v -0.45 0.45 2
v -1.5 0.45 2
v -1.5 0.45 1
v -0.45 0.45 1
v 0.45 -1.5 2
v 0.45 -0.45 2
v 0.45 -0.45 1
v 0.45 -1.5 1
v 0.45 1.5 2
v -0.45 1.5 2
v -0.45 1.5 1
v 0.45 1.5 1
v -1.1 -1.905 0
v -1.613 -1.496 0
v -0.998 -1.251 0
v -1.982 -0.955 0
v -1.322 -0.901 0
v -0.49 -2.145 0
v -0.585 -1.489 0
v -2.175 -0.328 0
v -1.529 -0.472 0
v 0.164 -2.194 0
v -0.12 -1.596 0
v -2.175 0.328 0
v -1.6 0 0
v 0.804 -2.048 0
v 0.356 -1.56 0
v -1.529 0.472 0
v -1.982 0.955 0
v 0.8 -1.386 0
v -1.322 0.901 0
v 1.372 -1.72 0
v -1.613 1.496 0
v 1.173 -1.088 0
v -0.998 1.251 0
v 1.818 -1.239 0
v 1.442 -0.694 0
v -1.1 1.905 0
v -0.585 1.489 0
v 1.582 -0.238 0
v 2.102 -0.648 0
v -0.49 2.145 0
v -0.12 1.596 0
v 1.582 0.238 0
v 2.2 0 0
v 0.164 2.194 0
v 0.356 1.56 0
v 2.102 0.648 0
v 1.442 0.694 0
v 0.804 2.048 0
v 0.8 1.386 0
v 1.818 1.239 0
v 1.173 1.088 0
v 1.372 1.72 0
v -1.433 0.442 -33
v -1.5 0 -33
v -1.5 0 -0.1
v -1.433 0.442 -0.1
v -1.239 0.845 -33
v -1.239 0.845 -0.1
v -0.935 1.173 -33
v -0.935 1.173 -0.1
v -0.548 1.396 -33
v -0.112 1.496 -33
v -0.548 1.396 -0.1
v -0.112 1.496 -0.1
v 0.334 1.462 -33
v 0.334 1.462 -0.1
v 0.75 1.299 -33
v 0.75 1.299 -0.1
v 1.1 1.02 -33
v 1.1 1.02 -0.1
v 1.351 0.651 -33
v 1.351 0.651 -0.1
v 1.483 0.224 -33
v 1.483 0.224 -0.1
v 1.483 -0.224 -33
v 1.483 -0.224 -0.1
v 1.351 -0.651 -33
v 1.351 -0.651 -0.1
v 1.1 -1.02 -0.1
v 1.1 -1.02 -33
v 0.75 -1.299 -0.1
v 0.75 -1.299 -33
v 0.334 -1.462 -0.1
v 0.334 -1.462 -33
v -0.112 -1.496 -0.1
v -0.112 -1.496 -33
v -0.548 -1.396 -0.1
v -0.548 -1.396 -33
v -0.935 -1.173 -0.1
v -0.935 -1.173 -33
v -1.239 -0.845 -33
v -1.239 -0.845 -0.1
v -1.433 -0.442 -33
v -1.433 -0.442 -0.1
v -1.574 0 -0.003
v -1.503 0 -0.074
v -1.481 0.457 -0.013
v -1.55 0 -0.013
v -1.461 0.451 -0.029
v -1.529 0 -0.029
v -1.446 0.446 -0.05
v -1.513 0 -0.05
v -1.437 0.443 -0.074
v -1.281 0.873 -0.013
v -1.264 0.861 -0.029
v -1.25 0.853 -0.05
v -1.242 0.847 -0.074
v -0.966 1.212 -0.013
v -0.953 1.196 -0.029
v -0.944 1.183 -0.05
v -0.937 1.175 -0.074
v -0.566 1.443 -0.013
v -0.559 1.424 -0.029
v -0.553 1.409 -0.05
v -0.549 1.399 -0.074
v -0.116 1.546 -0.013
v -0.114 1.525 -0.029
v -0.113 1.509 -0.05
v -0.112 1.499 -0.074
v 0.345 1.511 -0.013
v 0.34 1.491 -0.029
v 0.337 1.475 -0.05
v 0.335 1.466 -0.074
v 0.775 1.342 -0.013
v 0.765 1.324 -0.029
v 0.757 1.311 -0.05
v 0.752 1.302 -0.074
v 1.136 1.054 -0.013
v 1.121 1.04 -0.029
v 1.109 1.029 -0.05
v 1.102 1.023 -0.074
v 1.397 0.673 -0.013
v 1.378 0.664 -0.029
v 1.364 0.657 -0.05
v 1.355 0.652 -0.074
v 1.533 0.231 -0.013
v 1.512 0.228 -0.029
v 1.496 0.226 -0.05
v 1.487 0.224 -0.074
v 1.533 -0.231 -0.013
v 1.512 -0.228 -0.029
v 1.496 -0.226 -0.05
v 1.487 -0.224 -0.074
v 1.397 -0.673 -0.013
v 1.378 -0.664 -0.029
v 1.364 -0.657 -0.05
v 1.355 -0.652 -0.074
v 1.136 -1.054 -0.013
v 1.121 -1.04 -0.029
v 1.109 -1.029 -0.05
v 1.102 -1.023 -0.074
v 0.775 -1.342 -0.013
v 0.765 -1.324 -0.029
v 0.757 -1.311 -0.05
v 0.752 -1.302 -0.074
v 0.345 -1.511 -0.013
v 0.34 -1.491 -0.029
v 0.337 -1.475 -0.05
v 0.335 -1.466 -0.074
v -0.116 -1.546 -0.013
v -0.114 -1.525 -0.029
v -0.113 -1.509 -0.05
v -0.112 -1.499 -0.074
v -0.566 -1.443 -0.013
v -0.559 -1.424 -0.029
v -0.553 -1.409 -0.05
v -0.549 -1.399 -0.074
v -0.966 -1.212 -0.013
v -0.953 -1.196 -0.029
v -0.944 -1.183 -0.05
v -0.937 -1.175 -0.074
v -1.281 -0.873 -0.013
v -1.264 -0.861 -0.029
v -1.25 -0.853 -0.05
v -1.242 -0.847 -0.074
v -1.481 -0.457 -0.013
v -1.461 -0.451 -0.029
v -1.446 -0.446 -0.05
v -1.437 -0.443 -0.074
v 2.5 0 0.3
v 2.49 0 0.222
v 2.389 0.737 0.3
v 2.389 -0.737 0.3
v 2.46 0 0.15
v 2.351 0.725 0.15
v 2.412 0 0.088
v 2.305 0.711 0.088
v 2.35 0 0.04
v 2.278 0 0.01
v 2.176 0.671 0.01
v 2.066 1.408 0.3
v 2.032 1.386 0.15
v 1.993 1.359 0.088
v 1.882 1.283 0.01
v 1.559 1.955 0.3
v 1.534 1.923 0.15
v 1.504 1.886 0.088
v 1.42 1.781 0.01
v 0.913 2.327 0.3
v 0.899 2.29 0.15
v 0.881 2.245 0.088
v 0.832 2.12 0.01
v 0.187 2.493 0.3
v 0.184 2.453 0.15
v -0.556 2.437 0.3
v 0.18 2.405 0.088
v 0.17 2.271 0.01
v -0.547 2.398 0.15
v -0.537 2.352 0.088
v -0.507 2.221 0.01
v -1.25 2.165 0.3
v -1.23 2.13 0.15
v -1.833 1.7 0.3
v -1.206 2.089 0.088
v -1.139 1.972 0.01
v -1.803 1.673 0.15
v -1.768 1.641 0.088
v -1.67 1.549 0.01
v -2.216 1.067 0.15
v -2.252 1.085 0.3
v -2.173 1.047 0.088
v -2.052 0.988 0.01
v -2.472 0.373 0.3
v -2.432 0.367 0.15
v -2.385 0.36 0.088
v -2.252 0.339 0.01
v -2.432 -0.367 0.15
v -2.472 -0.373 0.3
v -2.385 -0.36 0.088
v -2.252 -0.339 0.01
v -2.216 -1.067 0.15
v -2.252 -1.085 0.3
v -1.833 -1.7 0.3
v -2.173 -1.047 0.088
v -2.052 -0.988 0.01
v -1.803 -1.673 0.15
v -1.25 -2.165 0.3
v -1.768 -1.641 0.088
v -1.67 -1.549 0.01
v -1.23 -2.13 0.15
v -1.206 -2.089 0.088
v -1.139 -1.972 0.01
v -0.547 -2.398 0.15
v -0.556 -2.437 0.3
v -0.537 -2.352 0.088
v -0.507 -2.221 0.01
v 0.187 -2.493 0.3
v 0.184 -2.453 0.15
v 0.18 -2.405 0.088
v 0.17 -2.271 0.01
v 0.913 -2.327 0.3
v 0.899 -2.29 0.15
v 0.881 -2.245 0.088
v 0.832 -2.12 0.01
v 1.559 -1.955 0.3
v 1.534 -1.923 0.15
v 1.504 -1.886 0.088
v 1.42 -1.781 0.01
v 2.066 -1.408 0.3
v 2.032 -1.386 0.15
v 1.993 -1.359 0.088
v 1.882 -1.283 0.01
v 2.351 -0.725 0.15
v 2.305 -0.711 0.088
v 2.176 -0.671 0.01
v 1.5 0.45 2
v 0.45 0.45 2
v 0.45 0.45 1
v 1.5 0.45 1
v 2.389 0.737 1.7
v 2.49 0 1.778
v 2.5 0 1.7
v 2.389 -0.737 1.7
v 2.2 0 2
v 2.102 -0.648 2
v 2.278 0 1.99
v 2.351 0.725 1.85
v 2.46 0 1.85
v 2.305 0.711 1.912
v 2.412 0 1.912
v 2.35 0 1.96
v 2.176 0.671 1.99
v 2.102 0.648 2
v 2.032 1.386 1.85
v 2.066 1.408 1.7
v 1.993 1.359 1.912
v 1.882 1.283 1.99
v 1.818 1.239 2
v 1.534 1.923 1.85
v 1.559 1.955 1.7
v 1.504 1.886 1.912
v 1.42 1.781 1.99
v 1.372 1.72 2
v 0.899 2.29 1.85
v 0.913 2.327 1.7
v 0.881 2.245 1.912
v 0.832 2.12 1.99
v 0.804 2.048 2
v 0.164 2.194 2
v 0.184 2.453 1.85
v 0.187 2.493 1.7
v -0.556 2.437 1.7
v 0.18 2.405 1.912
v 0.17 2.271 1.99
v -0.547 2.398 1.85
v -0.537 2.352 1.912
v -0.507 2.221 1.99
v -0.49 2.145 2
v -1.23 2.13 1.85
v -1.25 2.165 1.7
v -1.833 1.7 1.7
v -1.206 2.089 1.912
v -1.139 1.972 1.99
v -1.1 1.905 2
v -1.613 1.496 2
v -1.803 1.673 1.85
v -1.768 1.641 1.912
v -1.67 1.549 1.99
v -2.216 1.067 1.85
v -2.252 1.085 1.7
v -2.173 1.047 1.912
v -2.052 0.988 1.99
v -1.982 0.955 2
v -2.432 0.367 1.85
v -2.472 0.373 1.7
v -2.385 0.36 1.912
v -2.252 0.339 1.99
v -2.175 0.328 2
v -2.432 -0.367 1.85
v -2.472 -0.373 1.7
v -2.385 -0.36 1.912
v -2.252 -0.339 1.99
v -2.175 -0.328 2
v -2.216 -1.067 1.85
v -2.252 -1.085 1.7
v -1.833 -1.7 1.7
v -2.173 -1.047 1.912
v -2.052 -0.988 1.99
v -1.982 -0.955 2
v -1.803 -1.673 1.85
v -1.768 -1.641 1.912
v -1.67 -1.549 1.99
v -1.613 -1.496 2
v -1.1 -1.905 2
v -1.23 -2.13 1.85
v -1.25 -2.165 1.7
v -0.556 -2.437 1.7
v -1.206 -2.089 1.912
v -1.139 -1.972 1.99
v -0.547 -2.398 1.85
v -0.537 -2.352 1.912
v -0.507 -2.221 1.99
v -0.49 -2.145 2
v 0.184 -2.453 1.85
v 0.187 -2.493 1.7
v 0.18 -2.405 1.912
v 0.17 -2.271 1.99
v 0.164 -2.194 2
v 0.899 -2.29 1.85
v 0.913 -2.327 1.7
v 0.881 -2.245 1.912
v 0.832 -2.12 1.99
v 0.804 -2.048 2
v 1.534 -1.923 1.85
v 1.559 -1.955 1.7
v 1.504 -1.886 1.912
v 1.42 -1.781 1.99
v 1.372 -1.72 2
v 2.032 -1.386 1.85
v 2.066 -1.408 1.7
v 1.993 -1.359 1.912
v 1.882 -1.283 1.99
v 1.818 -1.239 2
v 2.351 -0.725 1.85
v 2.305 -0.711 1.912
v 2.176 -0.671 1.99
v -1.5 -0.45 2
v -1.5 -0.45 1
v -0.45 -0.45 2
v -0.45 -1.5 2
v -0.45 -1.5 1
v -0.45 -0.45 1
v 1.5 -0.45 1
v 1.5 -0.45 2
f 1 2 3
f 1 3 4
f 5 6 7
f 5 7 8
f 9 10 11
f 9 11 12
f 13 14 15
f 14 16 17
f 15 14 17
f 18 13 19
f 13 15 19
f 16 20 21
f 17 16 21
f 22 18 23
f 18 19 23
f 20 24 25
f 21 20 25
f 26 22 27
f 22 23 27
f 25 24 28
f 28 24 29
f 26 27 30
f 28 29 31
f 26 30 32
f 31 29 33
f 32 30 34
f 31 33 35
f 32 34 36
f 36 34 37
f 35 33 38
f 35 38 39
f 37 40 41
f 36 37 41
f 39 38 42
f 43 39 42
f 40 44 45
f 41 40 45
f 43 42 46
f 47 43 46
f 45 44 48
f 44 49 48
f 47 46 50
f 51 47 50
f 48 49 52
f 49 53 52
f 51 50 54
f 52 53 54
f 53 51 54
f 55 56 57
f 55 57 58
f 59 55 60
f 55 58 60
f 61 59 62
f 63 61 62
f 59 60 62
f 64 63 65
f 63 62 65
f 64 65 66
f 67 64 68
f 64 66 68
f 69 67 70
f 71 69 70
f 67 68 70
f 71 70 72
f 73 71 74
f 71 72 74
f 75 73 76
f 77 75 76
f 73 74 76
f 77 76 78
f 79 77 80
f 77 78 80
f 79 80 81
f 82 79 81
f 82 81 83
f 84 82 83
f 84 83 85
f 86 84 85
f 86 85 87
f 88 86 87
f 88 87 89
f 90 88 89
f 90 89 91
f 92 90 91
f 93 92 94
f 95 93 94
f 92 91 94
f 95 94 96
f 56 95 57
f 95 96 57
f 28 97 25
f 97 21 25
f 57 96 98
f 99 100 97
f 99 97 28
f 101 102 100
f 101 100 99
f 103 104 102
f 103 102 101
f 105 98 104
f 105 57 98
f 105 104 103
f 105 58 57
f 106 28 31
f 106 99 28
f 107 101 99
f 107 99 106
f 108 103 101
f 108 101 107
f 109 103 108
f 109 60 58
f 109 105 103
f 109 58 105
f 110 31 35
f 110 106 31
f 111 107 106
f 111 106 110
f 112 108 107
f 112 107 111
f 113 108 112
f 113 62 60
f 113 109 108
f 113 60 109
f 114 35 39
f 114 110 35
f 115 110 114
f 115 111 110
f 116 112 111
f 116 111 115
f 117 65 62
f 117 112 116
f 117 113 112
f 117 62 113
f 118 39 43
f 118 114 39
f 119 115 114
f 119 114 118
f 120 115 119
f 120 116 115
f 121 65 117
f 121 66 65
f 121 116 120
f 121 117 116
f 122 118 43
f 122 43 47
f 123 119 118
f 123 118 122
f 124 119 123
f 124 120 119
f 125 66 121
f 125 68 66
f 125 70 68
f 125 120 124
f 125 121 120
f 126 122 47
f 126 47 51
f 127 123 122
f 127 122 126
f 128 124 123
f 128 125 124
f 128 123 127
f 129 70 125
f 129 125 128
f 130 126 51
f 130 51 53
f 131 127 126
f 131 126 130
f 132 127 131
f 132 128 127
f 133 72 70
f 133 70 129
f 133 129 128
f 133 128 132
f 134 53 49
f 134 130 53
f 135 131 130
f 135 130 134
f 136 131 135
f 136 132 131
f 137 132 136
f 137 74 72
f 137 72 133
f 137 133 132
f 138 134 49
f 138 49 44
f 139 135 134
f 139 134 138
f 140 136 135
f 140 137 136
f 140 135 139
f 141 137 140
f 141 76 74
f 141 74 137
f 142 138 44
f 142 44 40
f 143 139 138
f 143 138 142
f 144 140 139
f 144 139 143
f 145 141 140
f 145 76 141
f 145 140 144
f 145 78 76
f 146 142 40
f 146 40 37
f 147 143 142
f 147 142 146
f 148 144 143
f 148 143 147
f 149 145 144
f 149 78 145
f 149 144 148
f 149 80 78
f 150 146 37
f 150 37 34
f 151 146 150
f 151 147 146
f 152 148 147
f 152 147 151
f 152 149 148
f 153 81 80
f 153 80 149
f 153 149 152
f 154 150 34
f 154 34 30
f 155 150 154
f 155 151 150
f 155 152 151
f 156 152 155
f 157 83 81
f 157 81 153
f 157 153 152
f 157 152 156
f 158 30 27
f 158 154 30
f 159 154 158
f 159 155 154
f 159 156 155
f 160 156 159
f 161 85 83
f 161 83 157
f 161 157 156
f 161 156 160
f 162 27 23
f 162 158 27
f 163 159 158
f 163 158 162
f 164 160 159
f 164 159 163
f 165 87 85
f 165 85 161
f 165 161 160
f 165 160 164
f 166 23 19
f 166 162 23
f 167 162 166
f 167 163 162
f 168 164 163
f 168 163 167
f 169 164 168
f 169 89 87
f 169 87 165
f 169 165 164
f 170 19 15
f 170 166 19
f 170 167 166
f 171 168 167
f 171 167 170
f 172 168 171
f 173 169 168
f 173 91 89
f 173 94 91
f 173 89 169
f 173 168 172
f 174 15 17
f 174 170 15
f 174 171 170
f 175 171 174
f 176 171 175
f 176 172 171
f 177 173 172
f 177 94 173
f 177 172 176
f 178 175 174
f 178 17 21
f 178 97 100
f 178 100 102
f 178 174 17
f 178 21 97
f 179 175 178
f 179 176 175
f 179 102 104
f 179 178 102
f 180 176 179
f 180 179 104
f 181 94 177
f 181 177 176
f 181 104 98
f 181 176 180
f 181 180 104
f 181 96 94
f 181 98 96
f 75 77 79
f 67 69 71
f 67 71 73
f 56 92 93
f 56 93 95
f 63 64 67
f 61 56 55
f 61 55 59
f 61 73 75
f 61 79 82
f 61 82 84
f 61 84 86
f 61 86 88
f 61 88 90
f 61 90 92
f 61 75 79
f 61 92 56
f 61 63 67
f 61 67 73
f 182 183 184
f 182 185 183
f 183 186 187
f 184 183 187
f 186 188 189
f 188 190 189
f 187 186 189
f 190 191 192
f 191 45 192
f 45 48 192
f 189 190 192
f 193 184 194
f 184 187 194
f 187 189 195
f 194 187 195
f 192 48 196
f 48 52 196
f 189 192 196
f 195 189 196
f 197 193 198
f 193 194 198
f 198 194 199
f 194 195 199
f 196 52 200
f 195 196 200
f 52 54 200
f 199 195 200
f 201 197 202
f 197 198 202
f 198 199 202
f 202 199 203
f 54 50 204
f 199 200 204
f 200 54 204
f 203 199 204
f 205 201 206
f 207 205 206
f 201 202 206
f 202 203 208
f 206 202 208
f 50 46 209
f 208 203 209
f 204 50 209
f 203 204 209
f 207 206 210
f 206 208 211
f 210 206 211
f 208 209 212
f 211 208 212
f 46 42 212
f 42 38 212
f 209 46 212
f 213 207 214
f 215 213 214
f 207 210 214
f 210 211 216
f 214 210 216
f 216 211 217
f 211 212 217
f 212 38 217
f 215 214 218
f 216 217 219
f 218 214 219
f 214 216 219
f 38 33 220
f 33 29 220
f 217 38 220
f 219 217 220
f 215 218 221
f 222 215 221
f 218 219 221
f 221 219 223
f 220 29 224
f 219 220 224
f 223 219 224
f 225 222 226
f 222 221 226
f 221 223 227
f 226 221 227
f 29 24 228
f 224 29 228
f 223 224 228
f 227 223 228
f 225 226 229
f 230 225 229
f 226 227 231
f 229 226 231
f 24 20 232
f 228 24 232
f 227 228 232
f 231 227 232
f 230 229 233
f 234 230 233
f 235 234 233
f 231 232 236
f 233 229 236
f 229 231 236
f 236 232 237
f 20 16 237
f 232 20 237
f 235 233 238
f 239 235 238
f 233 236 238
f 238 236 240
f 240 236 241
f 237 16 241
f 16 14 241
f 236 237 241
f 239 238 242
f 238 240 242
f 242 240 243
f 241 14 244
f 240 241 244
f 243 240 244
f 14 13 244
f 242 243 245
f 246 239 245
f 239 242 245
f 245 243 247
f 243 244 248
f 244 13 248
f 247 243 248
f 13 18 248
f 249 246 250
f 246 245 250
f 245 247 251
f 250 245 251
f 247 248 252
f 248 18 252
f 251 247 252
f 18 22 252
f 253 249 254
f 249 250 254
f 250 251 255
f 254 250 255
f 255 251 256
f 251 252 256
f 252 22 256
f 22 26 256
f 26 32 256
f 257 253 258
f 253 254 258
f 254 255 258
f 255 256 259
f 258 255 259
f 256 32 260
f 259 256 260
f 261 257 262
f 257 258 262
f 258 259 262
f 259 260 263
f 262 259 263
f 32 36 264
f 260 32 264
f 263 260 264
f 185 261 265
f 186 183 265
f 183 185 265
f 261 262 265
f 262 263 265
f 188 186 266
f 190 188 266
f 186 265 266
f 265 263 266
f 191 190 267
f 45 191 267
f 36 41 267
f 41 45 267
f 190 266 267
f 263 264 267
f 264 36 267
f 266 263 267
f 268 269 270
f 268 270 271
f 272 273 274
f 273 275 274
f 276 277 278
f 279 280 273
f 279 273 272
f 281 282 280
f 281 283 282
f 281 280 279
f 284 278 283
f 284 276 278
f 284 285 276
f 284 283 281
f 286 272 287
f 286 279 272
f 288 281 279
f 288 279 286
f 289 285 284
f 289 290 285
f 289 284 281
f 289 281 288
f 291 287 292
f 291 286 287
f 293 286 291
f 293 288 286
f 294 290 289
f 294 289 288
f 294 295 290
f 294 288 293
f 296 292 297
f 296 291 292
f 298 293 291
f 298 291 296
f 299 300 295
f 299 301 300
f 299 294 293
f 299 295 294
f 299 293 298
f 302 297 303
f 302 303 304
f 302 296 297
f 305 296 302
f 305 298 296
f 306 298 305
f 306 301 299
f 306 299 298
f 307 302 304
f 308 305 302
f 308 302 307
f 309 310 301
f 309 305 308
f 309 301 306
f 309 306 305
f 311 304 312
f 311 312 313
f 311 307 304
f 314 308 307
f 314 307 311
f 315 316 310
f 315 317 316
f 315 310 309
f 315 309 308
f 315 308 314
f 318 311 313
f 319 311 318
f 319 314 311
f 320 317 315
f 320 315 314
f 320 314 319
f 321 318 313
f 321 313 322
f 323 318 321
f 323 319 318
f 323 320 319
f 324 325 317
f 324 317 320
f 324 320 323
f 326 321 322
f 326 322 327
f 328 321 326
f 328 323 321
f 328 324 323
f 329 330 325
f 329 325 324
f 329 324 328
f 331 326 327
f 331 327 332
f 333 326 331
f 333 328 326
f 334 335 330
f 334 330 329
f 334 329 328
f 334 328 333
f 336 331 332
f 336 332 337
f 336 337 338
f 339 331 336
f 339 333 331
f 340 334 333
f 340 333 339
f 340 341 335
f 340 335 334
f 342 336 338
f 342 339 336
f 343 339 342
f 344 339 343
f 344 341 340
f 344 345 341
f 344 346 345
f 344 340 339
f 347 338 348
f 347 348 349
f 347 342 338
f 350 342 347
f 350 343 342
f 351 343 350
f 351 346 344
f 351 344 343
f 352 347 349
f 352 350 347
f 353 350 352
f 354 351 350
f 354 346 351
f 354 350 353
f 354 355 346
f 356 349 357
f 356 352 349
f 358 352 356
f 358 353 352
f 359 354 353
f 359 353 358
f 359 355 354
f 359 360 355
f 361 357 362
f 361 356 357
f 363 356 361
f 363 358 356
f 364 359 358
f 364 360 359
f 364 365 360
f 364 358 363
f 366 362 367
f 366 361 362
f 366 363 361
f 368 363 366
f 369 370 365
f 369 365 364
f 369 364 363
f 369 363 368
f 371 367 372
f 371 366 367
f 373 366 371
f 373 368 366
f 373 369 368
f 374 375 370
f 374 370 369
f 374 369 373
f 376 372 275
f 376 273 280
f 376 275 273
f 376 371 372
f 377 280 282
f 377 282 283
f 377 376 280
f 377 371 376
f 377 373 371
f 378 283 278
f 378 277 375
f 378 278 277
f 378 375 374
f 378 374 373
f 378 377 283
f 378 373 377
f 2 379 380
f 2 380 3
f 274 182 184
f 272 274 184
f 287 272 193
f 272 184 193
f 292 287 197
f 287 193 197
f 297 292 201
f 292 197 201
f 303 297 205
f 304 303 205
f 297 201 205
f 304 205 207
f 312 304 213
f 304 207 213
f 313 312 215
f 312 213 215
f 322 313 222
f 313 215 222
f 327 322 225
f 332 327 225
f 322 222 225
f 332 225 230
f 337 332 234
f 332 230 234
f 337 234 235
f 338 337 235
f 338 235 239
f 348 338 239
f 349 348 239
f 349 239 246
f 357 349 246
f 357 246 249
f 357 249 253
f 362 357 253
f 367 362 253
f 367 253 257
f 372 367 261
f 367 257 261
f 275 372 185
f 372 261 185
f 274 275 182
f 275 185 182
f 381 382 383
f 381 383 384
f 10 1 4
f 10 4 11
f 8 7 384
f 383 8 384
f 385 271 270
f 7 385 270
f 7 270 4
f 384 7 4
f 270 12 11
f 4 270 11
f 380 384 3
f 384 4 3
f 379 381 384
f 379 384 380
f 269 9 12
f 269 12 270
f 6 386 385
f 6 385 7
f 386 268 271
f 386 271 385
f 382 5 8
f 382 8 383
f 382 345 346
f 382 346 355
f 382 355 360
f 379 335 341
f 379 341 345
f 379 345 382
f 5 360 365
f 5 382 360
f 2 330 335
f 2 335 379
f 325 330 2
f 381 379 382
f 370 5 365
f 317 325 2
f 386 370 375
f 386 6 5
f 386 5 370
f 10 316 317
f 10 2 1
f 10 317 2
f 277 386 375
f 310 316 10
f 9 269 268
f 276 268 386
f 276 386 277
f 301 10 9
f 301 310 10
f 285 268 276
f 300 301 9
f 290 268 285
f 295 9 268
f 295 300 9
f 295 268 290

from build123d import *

# Parameters (mm, degrees)
SKETCH_1_R          = 2.5
EXTRUDE_1_DEPTH     = 2
SKETCH_2_R          = 1.5
EXTRUDE_2_DEPTH     = 33
FILLET_2_R          = 0.3
CUT_EXTRUDE_1_DEPTH = 1
FILLET_1_R          = 0.1


with BuildPart() as part:
    # Эскиз1 → Бобышка-Вытянуть1 (new body)
    with BuildSketch(Plane.XY):
        Circle(SKETCH_1_R)
    extrude(amount=EXTRUDE_1_DEPTH)

    # Эскиз2 → Бобышка-Вытянуть2 (add)
    with BuildSketch(Plane(origin=(0, 0, 0), x_dir=(-1, 0, 0), z_dir=(0, 0, -1))):
        Circle(SKETCH_2_R)
    extrude(amount=EXTRUDE_2_DEPTH)

    # Скругление2
    fillet_2_edges = [part.edges().sort_by_distance(p)[0] for p in [
        (-2.5, 0, 0),
        (-2.5, 0, 2),
    ]]
    fillet(fillet_2_edges, radius=FILLET_2_R)

    # Эскиз3 → Вырез-Вытянуть1 (cut)
    with BuildSketch(Plane.XY.offset(2)):
        Polygon((-0.45, 1.5), (0.45, 1.5), (0.45, 0.45), (1.5, 0.45), (1.5, -0.45), (0.45, -0.45), (0.45, -1.5), (-0.45, -1.5), (-0.45, -0.45), (-1.5, -0.45), (-1.5, 0.45), (-0.45, 0.45), align=None)
    extrude(amount=-CUT_EXTRUDE_1_DEPTH, mode=Mode.SUBTRACT)

    # Скругление1
    fillet_1_edges = [part.edges().sort_by_distance(p)[0] for p in [
        (1.5, 0, 0),
    ]]
    fillet(fillet_1_edges, radius=FILLET_1_R)


solid = part.part
